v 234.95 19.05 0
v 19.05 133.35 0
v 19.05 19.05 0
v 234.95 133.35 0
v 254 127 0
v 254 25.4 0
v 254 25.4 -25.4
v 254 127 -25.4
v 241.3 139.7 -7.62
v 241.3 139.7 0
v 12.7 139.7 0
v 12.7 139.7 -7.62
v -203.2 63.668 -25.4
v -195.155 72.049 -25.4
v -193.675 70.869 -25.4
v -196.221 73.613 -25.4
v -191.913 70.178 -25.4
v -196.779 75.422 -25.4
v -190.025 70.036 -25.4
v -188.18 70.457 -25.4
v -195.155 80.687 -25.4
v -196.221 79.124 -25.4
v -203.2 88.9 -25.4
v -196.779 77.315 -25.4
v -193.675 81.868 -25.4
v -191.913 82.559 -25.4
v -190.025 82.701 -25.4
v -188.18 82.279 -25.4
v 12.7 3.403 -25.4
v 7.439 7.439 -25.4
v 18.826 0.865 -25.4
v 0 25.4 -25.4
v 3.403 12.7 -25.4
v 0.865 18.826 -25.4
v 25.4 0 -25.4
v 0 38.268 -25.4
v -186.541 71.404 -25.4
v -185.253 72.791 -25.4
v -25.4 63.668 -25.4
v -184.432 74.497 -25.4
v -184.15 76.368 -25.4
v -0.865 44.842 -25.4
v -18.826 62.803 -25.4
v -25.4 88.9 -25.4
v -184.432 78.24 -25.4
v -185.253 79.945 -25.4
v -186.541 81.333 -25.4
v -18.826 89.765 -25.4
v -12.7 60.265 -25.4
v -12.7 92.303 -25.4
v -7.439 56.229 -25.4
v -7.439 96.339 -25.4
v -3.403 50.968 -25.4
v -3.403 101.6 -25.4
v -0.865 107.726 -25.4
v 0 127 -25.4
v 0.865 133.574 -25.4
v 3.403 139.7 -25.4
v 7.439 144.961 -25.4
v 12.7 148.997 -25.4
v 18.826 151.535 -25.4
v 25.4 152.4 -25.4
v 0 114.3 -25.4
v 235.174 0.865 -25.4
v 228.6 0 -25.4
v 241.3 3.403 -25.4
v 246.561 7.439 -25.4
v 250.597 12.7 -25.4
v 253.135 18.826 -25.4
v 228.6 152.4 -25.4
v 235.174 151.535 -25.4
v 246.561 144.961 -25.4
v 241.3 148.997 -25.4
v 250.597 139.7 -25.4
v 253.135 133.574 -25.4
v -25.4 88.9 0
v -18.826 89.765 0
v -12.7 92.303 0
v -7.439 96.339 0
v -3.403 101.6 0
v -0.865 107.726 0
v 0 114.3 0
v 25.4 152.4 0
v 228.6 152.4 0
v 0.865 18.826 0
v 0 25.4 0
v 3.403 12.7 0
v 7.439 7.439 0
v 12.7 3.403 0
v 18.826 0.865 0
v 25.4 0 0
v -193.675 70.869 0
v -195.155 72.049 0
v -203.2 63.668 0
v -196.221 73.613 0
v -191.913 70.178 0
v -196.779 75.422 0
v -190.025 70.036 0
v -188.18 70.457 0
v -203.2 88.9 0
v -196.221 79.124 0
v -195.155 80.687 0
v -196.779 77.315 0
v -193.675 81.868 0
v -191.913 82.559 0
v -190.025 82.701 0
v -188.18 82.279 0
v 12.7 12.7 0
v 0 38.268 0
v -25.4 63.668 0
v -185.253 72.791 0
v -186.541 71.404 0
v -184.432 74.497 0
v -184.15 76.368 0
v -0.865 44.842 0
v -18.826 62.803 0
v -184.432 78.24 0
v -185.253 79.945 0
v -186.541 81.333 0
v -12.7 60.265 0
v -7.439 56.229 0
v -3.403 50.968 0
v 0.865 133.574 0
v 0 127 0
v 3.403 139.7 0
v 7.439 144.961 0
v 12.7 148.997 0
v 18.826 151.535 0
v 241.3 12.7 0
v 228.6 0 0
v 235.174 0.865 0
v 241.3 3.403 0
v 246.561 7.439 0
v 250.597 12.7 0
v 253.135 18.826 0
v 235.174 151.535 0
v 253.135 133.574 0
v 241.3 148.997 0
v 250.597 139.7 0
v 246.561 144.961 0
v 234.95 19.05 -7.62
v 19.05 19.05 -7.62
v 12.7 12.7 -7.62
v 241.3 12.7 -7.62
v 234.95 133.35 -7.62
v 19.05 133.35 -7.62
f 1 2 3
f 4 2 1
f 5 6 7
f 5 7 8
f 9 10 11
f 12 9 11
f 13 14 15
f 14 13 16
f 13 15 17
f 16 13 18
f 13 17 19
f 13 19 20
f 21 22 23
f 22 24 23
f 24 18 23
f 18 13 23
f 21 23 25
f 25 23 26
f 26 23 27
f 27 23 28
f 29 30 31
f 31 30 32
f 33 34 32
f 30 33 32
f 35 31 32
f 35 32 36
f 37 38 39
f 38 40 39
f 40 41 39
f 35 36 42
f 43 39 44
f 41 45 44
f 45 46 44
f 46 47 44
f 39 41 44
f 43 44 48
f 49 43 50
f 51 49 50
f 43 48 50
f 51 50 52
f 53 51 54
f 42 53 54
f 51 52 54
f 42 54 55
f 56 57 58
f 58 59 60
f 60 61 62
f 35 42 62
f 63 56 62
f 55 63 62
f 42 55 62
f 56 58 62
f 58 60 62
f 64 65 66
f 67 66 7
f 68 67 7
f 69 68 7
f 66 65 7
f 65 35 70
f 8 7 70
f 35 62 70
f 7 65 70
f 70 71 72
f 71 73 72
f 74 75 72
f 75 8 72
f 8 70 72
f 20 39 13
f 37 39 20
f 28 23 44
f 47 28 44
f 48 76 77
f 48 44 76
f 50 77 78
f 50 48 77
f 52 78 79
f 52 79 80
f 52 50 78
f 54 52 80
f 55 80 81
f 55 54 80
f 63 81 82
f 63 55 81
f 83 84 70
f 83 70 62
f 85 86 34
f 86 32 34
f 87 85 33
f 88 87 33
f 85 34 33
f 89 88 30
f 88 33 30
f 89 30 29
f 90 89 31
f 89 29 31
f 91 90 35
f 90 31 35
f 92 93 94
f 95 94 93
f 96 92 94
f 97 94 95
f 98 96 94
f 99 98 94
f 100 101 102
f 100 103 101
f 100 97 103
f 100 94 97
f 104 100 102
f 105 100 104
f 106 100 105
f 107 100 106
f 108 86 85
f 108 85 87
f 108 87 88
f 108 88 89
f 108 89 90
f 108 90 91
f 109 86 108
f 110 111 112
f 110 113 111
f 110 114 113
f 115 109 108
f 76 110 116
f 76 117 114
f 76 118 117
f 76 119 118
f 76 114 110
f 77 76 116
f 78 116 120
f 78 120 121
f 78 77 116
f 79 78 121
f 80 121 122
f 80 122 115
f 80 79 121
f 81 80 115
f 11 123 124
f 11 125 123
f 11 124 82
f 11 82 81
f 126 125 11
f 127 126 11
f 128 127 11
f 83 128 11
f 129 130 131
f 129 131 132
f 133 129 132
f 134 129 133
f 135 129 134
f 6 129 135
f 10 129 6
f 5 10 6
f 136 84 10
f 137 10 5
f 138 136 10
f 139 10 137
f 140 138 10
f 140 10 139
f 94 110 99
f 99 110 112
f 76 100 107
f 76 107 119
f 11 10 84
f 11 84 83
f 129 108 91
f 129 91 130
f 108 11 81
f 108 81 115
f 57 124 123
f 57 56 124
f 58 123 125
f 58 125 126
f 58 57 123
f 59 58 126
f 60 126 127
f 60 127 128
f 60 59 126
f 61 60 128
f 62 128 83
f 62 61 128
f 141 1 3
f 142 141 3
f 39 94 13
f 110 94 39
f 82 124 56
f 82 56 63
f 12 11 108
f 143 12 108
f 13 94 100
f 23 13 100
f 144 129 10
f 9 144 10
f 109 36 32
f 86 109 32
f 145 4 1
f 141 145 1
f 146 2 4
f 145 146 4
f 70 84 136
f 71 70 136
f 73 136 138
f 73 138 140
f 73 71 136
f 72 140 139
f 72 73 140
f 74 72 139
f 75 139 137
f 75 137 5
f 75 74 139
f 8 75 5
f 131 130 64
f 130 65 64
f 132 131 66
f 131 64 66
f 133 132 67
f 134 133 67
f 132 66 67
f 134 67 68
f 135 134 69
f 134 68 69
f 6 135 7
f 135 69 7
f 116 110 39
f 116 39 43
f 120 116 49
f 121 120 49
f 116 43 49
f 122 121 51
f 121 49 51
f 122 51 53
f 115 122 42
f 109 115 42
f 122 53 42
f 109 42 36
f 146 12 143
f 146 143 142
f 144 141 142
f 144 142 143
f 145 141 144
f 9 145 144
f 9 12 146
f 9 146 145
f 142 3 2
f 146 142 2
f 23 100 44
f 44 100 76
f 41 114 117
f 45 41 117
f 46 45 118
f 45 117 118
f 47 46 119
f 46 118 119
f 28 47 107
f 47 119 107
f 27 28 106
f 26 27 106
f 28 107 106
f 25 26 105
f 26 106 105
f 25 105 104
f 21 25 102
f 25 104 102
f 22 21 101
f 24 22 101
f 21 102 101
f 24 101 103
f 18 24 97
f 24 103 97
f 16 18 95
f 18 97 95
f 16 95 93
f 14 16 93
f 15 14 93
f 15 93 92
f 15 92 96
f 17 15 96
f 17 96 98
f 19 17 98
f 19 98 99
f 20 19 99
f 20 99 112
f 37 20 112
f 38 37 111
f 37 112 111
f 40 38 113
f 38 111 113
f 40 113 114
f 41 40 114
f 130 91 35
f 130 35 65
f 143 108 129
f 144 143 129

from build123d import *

# Parameters (mm, degrees)
F0_W     = 203.2
F0_H     = 25.231637
F1_DEPTH = 25.4
F2_R     = 6.35
F3_DEPTH = 25.4
F5_DEPTH = 7.62
F6_R     = 25.4
F7_R     = 25.4


with BuildPart() as f1:
    # F0 (on Top) → F1 (new body)
    with BuildSketch(Plane.XY):
        with Locations((-101.6, 76.284181)):
            Rectangle(F0_W, F0_H)
        Polygon((0, 63.668363), (0, 0), (254, 0), (254, 152.4), (0, 152.4), (0, 88.9), align=None)
    extrude(amount=-F1_DEPTH)

    # F2 (on face) → F3 (cut)
    with BuildSketch(Plane.XY):
        with Locations((-190.5, 76.368363)):
            Circle(F2_R)
    extrude(amount=-F3_DEPTH, mode=Mode.SUBTRACT)

    # F4 (on face) → F5 (cut)
    with BuildSketch(Plane.XY):
        Polygon((241.3, 139.7), (12.7, 139.7), (12.7, 76.368363), (12.7, 76.2), (12.7, 12.7), (241.3, 12.7), align=None)
        Polygon((19.05, 82.718363), (19.05, 133.35), (234.95, 133.35), (234.95, 19.05), (19.05, 19.05), (19.05, 69.85), align=None, mode=Mode.SUBTRACT)
    extrude(amount=-F5_DEPTH, mode=Mode.SUBTRACT)

    # F6
    f6_edges = [f1.edges().sort_by_distance(p)[0] for p in [
        (0, 152.4, -12.7),
        (0, 88.9, -12.7),
    ]]
    fillet(f6_edges, radius=F6_R)

    # F7
    f7_edges = [f1.edges().sort_by_distance(p)[0] for p in [
        (0, 63.668363, -12.7),
        (0, 0, -12.7),
        (254, 152.4, -12.7),
        (254, 0, -12.7),
    ]]
    fillet(f7_edges, radius=F7_R)


solid = f1.part
